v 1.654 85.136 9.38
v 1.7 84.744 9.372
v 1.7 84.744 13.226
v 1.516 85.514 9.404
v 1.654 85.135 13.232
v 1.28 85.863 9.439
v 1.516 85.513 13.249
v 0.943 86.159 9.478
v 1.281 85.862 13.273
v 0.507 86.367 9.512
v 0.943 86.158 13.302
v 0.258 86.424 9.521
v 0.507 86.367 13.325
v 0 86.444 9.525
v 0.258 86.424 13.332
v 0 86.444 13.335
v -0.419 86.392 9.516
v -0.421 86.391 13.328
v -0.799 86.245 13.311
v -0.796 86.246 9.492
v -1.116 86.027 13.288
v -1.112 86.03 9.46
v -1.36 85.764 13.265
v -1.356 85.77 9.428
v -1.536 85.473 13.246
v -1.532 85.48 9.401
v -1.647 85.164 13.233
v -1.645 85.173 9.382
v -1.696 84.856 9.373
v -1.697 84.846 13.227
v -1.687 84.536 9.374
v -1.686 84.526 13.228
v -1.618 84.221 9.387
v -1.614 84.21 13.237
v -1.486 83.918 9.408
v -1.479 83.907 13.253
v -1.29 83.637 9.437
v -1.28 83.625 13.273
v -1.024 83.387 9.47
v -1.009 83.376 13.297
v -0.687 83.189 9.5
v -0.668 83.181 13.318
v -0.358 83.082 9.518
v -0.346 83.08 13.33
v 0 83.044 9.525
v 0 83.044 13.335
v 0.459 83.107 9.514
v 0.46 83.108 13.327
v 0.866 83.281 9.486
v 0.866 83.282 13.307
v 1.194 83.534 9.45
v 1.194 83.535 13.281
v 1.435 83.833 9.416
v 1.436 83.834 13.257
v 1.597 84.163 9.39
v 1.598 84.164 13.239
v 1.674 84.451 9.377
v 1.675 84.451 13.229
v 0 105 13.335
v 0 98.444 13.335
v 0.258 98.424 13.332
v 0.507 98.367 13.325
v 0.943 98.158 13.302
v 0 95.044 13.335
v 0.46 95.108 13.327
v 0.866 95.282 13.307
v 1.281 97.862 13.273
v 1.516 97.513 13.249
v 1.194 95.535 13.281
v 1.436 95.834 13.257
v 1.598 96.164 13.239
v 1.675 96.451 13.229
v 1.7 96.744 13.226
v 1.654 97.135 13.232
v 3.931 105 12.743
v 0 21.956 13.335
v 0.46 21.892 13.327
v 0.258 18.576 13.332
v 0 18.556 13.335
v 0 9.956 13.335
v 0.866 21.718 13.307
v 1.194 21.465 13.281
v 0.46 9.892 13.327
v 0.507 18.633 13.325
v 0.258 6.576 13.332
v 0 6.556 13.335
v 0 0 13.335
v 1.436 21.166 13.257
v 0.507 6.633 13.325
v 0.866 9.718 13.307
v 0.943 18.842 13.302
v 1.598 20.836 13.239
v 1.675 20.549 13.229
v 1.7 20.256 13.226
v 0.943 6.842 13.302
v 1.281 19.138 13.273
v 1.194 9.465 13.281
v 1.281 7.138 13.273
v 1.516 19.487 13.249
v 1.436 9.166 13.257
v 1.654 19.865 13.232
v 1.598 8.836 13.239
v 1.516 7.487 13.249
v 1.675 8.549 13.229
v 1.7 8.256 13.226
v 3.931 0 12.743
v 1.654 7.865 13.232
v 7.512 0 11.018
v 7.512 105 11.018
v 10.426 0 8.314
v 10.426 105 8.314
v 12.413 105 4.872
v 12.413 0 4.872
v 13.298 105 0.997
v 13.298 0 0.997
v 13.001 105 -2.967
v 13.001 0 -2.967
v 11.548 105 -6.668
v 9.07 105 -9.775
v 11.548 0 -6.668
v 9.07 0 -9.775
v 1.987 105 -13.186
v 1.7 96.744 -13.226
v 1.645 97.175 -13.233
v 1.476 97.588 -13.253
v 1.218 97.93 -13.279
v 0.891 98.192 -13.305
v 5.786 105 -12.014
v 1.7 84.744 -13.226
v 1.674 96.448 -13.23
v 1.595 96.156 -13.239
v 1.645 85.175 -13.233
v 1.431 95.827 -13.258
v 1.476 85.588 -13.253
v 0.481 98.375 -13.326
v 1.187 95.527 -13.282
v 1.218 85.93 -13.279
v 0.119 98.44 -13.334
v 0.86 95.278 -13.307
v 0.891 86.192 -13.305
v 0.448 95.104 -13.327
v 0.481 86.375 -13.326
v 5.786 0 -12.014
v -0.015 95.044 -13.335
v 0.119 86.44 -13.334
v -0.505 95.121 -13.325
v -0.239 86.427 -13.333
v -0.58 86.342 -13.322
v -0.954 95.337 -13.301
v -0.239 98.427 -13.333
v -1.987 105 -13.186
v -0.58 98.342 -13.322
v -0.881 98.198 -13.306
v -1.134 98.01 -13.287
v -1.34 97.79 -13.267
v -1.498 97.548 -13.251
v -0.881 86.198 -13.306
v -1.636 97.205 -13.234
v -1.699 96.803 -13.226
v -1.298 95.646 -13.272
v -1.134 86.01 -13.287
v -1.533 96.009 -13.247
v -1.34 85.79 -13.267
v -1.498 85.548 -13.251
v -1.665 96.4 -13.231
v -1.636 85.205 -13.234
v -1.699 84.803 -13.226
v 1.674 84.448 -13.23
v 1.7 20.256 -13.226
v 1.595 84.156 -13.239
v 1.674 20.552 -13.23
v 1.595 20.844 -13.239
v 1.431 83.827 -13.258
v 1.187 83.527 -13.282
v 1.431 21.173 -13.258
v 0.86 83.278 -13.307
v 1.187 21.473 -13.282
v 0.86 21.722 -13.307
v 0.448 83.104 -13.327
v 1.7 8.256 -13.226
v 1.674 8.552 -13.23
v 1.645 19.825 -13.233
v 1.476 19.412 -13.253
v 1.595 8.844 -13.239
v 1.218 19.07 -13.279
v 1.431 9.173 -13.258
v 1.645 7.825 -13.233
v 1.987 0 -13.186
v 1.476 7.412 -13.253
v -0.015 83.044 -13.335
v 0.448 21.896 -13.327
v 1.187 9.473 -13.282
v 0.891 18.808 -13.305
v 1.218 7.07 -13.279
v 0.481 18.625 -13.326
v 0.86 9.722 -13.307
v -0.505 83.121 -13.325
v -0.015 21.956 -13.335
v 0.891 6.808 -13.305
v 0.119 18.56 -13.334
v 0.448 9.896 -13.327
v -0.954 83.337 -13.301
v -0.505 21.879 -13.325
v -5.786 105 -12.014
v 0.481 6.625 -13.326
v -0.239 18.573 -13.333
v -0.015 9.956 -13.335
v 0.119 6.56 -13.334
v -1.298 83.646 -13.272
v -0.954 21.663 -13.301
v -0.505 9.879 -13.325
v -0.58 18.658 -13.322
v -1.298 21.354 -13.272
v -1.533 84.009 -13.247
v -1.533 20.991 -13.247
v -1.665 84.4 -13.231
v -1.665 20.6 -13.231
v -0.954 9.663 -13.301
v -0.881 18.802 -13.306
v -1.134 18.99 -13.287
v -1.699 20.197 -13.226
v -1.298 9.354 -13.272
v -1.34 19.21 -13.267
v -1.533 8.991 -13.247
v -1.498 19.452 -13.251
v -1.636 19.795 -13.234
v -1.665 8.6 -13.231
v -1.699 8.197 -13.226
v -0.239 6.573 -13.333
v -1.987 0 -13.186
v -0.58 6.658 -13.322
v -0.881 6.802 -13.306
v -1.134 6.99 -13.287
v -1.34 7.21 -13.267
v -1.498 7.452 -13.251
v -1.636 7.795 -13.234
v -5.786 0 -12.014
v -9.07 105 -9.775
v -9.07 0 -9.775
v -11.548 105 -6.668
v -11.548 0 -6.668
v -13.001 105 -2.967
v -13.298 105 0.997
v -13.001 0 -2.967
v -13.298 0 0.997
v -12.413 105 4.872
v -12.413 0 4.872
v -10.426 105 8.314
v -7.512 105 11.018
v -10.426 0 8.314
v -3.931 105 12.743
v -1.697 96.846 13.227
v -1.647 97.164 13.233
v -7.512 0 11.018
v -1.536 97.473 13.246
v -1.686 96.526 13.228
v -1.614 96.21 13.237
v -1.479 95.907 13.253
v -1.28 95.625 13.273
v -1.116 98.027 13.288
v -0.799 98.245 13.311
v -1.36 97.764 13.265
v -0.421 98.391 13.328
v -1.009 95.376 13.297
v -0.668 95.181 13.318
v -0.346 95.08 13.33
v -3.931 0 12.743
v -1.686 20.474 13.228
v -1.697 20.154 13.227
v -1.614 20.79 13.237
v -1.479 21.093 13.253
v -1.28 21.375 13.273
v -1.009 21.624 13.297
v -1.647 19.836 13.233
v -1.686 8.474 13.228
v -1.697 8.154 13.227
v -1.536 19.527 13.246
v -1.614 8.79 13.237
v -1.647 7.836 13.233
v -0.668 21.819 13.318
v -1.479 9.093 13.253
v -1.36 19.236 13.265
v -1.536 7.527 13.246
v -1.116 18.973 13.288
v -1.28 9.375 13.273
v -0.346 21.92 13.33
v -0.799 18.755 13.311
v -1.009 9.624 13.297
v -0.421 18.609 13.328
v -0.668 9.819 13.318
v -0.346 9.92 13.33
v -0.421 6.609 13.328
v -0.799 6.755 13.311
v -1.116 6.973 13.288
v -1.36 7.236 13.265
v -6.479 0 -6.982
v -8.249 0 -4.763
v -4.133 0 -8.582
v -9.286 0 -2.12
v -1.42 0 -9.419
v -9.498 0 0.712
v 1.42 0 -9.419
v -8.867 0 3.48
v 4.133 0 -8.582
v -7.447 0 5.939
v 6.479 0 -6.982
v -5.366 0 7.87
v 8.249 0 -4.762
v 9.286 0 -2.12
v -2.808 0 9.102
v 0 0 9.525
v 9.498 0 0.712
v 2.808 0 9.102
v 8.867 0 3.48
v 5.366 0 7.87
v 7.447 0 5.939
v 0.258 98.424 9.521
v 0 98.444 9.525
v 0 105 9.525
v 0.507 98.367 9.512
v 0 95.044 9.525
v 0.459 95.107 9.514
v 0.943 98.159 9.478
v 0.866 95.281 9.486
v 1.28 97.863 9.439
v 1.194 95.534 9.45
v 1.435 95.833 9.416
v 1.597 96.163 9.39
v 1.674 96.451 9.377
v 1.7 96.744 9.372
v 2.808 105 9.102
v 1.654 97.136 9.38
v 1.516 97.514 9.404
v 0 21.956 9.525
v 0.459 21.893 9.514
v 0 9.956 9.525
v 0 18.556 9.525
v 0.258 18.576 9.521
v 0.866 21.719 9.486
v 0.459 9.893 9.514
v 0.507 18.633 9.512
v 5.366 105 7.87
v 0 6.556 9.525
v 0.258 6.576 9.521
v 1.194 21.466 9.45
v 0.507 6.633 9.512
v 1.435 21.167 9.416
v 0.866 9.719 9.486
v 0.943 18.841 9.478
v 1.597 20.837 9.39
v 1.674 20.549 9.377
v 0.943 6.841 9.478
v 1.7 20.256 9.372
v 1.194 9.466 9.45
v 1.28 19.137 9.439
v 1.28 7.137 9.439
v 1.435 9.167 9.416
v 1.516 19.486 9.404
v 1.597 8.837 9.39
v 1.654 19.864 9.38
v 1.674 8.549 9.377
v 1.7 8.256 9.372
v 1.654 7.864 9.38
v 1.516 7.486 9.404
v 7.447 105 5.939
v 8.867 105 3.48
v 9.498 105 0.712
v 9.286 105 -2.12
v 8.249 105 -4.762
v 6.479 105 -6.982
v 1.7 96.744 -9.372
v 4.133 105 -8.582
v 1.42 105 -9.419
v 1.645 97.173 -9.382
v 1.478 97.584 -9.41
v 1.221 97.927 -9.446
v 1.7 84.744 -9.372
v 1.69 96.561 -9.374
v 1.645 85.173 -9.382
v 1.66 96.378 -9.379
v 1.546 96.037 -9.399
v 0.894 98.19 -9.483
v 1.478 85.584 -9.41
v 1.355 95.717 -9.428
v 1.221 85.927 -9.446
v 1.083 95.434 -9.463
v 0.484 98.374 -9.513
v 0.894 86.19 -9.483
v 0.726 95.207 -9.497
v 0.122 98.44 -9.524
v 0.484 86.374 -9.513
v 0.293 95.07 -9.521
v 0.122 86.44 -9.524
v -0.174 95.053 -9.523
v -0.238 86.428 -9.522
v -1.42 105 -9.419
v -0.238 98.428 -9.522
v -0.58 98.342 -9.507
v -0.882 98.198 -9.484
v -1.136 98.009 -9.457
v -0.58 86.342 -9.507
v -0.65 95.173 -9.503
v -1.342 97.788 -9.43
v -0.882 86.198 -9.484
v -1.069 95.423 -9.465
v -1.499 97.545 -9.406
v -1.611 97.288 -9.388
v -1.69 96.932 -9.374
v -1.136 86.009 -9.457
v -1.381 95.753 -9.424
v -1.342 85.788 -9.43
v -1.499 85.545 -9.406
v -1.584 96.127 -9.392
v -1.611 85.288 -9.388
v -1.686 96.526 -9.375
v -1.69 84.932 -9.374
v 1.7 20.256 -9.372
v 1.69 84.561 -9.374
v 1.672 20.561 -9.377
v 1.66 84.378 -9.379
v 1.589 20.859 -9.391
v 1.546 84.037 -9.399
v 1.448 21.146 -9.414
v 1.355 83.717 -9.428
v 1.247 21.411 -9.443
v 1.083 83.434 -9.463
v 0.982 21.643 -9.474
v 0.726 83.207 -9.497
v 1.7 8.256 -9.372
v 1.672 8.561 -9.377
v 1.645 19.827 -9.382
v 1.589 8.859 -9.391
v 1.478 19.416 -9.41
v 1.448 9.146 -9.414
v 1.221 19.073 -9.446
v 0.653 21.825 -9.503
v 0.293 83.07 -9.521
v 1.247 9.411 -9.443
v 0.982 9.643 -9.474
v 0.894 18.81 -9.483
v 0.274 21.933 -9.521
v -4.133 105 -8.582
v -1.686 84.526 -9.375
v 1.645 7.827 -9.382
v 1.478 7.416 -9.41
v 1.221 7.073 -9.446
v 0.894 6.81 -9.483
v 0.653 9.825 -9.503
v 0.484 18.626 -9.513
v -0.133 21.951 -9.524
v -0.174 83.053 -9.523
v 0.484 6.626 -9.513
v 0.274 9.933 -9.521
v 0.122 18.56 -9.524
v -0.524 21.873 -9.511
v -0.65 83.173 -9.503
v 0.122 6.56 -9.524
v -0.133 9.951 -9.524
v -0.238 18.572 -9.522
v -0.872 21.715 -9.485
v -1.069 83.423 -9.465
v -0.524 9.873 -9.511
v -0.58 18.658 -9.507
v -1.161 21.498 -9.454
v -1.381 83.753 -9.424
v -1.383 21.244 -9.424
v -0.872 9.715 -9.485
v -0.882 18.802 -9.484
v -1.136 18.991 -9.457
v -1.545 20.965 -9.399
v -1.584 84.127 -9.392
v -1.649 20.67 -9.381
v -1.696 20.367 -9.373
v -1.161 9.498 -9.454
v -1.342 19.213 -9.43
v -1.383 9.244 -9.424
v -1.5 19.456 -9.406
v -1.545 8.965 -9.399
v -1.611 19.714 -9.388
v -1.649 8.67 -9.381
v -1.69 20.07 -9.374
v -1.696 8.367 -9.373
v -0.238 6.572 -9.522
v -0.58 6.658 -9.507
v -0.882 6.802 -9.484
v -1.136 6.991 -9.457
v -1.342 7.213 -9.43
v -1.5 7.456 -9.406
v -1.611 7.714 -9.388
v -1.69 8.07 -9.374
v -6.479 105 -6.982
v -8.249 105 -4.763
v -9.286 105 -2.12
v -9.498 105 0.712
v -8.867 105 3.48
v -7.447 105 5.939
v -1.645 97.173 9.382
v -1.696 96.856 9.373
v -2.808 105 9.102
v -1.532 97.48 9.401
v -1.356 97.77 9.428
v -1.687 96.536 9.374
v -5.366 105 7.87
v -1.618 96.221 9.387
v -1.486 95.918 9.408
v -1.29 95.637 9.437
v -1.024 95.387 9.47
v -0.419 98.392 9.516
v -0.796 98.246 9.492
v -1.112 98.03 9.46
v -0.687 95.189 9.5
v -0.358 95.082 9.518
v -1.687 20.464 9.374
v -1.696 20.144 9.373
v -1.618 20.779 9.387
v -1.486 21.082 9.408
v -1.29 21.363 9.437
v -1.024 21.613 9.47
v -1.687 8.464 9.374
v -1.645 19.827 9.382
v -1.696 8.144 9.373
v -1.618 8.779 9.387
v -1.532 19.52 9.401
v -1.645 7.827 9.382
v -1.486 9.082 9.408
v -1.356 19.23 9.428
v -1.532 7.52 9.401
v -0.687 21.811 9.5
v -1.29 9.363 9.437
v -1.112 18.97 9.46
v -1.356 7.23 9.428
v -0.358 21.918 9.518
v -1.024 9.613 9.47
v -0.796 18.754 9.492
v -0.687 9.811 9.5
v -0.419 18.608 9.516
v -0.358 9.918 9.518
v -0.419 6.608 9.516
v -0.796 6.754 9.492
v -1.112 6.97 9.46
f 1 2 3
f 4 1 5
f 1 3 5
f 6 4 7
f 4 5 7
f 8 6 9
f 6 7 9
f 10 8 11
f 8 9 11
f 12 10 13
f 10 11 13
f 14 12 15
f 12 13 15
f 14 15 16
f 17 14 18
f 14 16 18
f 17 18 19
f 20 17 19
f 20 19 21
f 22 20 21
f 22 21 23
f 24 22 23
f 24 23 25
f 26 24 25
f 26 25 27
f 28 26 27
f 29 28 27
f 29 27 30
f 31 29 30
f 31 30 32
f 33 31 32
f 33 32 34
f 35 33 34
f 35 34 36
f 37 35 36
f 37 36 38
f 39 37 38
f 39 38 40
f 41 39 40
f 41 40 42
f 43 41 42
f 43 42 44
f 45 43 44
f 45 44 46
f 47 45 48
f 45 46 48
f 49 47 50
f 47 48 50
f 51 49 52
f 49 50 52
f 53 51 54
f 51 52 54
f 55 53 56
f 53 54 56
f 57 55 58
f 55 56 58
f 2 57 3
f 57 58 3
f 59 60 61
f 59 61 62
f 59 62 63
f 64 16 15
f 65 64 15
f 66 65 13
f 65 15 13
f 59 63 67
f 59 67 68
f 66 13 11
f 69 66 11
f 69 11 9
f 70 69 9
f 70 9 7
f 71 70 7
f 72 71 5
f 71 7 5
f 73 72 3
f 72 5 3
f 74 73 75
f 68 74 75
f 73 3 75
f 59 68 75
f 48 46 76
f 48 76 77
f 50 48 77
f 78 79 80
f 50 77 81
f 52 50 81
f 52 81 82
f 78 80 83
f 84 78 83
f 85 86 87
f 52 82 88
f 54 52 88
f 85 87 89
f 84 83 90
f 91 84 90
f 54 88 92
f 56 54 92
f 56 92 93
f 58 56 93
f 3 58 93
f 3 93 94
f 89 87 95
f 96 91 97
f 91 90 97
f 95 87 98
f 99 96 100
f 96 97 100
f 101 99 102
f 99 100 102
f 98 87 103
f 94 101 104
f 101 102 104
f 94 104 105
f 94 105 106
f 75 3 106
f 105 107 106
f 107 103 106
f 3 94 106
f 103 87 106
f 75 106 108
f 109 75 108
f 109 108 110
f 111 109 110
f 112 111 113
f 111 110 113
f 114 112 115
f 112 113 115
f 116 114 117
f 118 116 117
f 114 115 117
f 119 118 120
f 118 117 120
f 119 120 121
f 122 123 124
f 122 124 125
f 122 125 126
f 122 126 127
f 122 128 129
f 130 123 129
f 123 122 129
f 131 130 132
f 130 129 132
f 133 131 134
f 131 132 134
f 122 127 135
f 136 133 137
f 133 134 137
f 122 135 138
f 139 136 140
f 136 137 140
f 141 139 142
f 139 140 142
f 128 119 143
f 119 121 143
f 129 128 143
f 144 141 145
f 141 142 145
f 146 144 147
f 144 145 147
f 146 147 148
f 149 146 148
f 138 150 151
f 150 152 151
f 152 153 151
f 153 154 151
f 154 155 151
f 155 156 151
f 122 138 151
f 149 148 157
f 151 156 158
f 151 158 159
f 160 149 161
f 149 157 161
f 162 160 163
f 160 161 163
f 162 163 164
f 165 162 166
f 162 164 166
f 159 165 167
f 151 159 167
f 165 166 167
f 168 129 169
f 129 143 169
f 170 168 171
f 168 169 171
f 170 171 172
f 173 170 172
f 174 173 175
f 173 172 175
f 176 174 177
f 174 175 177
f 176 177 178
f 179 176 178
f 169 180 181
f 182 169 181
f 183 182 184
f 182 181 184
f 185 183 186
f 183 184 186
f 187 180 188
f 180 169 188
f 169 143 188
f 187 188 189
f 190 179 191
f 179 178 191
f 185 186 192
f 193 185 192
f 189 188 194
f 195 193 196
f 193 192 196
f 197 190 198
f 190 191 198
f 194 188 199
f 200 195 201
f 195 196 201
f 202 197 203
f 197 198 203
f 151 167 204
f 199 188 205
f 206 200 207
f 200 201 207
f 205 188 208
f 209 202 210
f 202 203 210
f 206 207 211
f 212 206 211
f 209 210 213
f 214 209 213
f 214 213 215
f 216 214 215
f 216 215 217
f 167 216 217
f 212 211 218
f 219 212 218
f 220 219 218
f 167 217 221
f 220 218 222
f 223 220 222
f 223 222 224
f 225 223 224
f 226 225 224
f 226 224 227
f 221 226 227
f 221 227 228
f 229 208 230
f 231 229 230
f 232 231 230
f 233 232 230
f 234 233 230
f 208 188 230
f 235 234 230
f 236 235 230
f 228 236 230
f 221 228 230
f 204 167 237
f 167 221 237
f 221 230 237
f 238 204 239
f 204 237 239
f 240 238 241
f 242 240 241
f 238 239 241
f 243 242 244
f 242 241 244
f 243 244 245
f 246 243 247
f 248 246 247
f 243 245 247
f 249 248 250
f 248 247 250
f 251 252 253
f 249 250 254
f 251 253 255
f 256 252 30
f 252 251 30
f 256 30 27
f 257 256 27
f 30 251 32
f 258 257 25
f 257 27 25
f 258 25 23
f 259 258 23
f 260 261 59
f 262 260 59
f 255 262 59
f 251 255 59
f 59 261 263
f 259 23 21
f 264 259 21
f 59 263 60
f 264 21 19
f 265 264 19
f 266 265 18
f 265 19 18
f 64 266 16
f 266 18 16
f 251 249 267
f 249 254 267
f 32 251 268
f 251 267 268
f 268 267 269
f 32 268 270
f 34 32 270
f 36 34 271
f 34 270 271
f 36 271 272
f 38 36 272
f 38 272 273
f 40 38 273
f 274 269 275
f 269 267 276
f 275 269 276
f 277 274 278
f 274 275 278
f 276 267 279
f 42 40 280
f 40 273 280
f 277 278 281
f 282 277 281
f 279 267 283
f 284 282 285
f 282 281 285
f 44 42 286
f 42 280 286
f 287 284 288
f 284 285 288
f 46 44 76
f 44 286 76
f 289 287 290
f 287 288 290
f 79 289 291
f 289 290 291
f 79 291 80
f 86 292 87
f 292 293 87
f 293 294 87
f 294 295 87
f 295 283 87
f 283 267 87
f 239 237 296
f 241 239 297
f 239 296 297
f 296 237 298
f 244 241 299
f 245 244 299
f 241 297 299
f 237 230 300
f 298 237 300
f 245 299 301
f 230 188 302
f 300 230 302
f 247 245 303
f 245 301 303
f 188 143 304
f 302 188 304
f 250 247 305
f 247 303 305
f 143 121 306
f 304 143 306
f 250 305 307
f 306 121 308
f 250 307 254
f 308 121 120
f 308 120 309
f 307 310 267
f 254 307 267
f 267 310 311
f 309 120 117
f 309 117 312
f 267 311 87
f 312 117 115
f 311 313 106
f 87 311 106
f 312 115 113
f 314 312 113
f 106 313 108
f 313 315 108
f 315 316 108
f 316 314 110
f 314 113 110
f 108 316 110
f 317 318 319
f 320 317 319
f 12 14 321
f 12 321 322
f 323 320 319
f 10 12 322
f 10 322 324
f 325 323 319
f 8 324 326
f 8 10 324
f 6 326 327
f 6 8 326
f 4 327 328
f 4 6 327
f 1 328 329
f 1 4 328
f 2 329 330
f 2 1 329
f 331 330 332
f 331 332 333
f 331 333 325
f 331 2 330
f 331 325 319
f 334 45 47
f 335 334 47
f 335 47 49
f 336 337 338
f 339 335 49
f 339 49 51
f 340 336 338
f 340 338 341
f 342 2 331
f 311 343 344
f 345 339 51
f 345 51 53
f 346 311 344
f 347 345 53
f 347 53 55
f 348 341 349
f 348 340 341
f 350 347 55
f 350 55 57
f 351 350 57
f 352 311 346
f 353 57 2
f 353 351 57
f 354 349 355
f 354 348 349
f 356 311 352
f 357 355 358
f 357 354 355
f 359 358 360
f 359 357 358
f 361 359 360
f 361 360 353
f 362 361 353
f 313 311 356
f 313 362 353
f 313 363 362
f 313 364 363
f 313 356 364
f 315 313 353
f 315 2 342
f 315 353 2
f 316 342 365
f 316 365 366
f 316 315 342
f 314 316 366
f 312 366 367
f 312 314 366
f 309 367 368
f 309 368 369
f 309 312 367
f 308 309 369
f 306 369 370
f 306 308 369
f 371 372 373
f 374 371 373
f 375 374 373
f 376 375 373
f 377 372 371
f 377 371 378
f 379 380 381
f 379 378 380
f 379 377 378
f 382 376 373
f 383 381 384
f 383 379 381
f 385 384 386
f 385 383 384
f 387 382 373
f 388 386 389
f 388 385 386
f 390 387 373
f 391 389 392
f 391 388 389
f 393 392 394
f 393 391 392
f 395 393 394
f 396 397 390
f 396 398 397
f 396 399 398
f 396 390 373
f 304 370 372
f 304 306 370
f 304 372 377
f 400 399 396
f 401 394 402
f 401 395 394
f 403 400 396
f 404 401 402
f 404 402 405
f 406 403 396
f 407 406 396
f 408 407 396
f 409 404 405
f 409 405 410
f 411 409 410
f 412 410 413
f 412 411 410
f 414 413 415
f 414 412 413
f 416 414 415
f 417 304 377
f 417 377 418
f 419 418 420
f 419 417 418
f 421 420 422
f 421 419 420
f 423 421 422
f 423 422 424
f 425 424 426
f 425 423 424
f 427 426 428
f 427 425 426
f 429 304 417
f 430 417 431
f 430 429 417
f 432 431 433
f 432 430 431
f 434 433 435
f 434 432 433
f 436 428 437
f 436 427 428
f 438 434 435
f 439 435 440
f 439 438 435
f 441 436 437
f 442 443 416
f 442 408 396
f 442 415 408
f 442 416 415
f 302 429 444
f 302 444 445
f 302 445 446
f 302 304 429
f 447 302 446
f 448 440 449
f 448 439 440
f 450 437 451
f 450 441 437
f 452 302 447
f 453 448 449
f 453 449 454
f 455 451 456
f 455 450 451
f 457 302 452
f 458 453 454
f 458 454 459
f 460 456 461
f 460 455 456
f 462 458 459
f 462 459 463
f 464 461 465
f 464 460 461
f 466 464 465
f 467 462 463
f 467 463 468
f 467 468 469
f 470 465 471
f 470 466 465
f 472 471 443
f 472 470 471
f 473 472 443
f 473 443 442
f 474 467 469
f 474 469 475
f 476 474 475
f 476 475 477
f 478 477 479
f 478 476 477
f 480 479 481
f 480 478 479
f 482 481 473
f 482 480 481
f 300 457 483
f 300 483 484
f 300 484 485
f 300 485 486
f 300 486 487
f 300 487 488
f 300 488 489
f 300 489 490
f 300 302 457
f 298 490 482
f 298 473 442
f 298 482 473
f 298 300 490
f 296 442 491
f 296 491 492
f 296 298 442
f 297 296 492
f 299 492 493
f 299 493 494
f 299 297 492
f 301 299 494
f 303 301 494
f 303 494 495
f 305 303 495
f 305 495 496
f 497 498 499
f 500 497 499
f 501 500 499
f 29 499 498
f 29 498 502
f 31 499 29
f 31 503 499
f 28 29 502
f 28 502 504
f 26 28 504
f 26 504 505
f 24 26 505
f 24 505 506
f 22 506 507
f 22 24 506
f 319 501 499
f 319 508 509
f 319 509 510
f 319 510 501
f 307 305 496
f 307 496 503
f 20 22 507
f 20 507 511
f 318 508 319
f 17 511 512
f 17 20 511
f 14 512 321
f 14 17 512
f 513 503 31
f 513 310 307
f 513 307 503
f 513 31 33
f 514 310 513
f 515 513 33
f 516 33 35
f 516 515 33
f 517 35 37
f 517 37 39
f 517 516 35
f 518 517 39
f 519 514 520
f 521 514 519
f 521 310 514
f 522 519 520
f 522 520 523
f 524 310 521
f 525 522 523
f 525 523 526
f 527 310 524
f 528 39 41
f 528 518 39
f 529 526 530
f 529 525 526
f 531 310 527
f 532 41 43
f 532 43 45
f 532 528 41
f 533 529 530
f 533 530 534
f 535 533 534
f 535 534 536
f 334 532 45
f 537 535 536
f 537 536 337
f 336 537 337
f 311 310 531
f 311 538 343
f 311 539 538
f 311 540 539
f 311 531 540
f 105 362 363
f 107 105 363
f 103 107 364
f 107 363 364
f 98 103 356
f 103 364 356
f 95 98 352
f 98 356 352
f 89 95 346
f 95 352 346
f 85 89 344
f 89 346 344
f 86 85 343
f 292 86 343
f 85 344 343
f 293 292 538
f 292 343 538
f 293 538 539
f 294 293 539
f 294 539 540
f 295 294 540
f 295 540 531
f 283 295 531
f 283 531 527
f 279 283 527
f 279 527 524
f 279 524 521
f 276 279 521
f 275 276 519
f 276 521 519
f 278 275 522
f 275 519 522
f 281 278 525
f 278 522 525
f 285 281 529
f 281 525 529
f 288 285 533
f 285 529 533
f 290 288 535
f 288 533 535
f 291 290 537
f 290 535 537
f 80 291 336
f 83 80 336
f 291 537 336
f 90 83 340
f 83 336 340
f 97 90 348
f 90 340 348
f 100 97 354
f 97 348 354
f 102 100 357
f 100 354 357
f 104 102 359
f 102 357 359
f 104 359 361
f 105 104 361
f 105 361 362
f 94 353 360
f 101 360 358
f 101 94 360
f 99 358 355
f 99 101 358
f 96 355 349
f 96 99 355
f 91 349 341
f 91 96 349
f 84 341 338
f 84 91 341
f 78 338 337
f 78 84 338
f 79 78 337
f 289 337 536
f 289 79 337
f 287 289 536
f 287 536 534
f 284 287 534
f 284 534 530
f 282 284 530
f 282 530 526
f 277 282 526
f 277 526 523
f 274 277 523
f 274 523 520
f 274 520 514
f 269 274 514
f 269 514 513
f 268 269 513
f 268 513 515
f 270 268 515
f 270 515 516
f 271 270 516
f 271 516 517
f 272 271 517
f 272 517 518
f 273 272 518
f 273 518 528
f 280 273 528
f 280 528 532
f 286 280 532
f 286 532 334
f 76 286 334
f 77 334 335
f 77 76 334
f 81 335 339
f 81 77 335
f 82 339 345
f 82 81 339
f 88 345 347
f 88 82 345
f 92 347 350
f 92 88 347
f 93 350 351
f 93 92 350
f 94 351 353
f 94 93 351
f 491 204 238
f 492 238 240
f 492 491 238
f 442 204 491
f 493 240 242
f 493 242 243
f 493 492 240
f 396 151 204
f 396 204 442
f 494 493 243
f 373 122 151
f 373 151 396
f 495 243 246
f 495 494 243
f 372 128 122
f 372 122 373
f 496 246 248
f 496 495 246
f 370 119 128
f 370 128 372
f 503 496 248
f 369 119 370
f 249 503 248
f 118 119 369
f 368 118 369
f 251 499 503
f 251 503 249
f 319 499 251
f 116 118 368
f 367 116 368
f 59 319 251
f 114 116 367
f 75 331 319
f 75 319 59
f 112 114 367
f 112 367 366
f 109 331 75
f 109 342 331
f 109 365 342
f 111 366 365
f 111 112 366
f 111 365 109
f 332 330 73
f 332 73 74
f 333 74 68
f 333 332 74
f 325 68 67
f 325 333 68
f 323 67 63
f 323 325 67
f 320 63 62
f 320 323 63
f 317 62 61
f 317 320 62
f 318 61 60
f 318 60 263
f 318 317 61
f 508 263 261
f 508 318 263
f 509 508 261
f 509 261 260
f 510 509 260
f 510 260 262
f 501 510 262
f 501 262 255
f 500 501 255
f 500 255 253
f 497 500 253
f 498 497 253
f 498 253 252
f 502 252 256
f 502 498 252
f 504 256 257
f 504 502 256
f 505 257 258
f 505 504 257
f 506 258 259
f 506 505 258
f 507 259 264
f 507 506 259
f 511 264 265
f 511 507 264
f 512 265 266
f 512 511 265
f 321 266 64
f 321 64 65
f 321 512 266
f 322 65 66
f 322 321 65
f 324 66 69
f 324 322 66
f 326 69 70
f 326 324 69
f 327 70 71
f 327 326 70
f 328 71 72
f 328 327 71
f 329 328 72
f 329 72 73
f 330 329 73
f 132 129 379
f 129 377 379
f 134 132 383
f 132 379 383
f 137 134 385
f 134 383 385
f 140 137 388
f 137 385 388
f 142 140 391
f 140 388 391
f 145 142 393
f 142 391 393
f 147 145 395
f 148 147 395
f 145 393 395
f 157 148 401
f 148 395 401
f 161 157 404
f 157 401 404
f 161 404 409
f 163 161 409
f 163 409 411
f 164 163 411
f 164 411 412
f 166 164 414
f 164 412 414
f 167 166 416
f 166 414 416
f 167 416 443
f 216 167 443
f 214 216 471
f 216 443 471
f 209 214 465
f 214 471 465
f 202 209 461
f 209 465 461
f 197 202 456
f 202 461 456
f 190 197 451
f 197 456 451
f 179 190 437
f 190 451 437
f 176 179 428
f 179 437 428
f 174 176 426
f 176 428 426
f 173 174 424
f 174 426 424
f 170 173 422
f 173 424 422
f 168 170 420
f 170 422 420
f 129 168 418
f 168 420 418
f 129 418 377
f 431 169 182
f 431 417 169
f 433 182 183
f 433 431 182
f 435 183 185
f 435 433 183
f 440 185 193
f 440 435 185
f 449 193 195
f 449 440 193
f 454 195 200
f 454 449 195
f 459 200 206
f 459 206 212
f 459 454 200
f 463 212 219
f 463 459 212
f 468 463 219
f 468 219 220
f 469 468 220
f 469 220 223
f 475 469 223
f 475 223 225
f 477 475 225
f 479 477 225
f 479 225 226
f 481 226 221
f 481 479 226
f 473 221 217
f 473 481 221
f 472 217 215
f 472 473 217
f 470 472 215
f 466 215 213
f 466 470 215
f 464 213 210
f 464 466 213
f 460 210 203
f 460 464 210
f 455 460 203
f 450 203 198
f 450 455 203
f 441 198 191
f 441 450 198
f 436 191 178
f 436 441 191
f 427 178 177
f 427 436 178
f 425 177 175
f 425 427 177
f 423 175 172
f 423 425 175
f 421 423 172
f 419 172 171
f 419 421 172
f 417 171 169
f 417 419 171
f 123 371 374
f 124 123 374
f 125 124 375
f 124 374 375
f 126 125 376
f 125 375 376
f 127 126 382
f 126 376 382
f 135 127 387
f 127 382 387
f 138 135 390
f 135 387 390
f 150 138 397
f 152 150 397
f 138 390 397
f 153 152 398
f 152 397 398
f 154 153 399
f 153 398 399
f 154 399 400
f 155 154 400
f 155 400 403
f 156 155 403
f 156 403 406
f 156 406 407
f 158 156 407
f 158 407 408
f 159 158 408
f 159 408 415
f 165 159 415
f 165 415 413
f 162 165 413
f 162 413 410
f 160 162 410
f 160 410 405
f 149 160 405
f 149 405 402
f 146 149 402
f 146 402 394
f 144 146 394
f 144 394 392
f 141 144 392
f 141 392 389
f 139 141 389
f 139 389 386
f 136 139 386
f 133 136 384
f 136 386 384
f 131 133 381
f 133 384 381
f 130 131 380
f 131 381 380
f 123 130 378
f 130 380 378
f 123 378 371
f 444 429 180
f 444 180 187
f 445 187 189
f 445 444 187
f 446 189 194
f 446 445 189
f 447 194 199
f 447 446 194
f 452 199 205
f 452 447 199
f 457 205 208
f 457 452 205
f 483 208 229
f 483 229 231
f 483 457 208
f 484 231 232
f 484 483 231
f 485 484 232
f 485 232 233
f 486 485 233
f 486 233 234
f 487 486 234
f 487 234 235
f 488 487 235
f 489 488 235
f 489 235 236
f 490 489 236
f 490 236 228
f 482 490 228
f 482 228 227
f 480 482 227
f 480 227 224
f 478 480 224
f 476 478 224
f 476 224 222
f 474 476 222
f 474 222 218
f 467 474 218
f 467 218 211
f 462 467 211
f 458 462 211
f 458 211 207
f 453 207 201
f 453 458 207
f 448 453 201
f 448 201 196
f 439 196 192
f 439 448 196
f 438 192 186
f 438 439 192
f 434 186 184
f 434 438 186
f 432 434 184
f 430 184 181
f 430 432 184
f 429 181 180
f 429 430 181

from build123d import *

# Parameters (mm, degrees)
SKETCH1_R           = 13.335
SKETCH1_R_2         = 9.525
BOSS_EXTRUDE1_DEPTH = 105
SKETCH4_R           = 1.7
CUT_EXTRUDE1_DEPTH  = 107.680103346


with BuildPart() as part:
    # Sketch1 → Boss-Extrude1 (new body)
    with BuildSketch(Plane(origin=(0, 0, 0), x_dir=(1, 0, 0), z_dir=(0, 1, 0))):
        with Locations(Location((0, 0, 0), (0, 0, 270))):
            Circle(SKETCH1_R)
        with Locations(Location((0, 0, 0), (0, 0, 270))):
            Circle(SKETCH1_R_2, mode=Mode.SUBTRACT)
    extrude(amount=BOSS_EXTRUDE1_DEPTH)

    # Sketch4 → Cut-Extrude1 (cut, symmetric)
    with BuildSketch(Plane.XY):
        with Locations((0, 96.744231704)):
            Circle(SKETCH4_R)
        with Locations((0, 84.744231704)):
            Circle(SKETCH4_R)
    cut_extrude1 = extrude(amount=CUT_EXTRUDE1_DEPTH, both=True, mode=Mode.SUBTRACT)

    # Mirror2: Cut-Extrude1 across plane
    add(cut_extrude1.mirror(Plane.ZX.offset(52.5)), mode=Mode.SUBTRACT)


solid = part.part
